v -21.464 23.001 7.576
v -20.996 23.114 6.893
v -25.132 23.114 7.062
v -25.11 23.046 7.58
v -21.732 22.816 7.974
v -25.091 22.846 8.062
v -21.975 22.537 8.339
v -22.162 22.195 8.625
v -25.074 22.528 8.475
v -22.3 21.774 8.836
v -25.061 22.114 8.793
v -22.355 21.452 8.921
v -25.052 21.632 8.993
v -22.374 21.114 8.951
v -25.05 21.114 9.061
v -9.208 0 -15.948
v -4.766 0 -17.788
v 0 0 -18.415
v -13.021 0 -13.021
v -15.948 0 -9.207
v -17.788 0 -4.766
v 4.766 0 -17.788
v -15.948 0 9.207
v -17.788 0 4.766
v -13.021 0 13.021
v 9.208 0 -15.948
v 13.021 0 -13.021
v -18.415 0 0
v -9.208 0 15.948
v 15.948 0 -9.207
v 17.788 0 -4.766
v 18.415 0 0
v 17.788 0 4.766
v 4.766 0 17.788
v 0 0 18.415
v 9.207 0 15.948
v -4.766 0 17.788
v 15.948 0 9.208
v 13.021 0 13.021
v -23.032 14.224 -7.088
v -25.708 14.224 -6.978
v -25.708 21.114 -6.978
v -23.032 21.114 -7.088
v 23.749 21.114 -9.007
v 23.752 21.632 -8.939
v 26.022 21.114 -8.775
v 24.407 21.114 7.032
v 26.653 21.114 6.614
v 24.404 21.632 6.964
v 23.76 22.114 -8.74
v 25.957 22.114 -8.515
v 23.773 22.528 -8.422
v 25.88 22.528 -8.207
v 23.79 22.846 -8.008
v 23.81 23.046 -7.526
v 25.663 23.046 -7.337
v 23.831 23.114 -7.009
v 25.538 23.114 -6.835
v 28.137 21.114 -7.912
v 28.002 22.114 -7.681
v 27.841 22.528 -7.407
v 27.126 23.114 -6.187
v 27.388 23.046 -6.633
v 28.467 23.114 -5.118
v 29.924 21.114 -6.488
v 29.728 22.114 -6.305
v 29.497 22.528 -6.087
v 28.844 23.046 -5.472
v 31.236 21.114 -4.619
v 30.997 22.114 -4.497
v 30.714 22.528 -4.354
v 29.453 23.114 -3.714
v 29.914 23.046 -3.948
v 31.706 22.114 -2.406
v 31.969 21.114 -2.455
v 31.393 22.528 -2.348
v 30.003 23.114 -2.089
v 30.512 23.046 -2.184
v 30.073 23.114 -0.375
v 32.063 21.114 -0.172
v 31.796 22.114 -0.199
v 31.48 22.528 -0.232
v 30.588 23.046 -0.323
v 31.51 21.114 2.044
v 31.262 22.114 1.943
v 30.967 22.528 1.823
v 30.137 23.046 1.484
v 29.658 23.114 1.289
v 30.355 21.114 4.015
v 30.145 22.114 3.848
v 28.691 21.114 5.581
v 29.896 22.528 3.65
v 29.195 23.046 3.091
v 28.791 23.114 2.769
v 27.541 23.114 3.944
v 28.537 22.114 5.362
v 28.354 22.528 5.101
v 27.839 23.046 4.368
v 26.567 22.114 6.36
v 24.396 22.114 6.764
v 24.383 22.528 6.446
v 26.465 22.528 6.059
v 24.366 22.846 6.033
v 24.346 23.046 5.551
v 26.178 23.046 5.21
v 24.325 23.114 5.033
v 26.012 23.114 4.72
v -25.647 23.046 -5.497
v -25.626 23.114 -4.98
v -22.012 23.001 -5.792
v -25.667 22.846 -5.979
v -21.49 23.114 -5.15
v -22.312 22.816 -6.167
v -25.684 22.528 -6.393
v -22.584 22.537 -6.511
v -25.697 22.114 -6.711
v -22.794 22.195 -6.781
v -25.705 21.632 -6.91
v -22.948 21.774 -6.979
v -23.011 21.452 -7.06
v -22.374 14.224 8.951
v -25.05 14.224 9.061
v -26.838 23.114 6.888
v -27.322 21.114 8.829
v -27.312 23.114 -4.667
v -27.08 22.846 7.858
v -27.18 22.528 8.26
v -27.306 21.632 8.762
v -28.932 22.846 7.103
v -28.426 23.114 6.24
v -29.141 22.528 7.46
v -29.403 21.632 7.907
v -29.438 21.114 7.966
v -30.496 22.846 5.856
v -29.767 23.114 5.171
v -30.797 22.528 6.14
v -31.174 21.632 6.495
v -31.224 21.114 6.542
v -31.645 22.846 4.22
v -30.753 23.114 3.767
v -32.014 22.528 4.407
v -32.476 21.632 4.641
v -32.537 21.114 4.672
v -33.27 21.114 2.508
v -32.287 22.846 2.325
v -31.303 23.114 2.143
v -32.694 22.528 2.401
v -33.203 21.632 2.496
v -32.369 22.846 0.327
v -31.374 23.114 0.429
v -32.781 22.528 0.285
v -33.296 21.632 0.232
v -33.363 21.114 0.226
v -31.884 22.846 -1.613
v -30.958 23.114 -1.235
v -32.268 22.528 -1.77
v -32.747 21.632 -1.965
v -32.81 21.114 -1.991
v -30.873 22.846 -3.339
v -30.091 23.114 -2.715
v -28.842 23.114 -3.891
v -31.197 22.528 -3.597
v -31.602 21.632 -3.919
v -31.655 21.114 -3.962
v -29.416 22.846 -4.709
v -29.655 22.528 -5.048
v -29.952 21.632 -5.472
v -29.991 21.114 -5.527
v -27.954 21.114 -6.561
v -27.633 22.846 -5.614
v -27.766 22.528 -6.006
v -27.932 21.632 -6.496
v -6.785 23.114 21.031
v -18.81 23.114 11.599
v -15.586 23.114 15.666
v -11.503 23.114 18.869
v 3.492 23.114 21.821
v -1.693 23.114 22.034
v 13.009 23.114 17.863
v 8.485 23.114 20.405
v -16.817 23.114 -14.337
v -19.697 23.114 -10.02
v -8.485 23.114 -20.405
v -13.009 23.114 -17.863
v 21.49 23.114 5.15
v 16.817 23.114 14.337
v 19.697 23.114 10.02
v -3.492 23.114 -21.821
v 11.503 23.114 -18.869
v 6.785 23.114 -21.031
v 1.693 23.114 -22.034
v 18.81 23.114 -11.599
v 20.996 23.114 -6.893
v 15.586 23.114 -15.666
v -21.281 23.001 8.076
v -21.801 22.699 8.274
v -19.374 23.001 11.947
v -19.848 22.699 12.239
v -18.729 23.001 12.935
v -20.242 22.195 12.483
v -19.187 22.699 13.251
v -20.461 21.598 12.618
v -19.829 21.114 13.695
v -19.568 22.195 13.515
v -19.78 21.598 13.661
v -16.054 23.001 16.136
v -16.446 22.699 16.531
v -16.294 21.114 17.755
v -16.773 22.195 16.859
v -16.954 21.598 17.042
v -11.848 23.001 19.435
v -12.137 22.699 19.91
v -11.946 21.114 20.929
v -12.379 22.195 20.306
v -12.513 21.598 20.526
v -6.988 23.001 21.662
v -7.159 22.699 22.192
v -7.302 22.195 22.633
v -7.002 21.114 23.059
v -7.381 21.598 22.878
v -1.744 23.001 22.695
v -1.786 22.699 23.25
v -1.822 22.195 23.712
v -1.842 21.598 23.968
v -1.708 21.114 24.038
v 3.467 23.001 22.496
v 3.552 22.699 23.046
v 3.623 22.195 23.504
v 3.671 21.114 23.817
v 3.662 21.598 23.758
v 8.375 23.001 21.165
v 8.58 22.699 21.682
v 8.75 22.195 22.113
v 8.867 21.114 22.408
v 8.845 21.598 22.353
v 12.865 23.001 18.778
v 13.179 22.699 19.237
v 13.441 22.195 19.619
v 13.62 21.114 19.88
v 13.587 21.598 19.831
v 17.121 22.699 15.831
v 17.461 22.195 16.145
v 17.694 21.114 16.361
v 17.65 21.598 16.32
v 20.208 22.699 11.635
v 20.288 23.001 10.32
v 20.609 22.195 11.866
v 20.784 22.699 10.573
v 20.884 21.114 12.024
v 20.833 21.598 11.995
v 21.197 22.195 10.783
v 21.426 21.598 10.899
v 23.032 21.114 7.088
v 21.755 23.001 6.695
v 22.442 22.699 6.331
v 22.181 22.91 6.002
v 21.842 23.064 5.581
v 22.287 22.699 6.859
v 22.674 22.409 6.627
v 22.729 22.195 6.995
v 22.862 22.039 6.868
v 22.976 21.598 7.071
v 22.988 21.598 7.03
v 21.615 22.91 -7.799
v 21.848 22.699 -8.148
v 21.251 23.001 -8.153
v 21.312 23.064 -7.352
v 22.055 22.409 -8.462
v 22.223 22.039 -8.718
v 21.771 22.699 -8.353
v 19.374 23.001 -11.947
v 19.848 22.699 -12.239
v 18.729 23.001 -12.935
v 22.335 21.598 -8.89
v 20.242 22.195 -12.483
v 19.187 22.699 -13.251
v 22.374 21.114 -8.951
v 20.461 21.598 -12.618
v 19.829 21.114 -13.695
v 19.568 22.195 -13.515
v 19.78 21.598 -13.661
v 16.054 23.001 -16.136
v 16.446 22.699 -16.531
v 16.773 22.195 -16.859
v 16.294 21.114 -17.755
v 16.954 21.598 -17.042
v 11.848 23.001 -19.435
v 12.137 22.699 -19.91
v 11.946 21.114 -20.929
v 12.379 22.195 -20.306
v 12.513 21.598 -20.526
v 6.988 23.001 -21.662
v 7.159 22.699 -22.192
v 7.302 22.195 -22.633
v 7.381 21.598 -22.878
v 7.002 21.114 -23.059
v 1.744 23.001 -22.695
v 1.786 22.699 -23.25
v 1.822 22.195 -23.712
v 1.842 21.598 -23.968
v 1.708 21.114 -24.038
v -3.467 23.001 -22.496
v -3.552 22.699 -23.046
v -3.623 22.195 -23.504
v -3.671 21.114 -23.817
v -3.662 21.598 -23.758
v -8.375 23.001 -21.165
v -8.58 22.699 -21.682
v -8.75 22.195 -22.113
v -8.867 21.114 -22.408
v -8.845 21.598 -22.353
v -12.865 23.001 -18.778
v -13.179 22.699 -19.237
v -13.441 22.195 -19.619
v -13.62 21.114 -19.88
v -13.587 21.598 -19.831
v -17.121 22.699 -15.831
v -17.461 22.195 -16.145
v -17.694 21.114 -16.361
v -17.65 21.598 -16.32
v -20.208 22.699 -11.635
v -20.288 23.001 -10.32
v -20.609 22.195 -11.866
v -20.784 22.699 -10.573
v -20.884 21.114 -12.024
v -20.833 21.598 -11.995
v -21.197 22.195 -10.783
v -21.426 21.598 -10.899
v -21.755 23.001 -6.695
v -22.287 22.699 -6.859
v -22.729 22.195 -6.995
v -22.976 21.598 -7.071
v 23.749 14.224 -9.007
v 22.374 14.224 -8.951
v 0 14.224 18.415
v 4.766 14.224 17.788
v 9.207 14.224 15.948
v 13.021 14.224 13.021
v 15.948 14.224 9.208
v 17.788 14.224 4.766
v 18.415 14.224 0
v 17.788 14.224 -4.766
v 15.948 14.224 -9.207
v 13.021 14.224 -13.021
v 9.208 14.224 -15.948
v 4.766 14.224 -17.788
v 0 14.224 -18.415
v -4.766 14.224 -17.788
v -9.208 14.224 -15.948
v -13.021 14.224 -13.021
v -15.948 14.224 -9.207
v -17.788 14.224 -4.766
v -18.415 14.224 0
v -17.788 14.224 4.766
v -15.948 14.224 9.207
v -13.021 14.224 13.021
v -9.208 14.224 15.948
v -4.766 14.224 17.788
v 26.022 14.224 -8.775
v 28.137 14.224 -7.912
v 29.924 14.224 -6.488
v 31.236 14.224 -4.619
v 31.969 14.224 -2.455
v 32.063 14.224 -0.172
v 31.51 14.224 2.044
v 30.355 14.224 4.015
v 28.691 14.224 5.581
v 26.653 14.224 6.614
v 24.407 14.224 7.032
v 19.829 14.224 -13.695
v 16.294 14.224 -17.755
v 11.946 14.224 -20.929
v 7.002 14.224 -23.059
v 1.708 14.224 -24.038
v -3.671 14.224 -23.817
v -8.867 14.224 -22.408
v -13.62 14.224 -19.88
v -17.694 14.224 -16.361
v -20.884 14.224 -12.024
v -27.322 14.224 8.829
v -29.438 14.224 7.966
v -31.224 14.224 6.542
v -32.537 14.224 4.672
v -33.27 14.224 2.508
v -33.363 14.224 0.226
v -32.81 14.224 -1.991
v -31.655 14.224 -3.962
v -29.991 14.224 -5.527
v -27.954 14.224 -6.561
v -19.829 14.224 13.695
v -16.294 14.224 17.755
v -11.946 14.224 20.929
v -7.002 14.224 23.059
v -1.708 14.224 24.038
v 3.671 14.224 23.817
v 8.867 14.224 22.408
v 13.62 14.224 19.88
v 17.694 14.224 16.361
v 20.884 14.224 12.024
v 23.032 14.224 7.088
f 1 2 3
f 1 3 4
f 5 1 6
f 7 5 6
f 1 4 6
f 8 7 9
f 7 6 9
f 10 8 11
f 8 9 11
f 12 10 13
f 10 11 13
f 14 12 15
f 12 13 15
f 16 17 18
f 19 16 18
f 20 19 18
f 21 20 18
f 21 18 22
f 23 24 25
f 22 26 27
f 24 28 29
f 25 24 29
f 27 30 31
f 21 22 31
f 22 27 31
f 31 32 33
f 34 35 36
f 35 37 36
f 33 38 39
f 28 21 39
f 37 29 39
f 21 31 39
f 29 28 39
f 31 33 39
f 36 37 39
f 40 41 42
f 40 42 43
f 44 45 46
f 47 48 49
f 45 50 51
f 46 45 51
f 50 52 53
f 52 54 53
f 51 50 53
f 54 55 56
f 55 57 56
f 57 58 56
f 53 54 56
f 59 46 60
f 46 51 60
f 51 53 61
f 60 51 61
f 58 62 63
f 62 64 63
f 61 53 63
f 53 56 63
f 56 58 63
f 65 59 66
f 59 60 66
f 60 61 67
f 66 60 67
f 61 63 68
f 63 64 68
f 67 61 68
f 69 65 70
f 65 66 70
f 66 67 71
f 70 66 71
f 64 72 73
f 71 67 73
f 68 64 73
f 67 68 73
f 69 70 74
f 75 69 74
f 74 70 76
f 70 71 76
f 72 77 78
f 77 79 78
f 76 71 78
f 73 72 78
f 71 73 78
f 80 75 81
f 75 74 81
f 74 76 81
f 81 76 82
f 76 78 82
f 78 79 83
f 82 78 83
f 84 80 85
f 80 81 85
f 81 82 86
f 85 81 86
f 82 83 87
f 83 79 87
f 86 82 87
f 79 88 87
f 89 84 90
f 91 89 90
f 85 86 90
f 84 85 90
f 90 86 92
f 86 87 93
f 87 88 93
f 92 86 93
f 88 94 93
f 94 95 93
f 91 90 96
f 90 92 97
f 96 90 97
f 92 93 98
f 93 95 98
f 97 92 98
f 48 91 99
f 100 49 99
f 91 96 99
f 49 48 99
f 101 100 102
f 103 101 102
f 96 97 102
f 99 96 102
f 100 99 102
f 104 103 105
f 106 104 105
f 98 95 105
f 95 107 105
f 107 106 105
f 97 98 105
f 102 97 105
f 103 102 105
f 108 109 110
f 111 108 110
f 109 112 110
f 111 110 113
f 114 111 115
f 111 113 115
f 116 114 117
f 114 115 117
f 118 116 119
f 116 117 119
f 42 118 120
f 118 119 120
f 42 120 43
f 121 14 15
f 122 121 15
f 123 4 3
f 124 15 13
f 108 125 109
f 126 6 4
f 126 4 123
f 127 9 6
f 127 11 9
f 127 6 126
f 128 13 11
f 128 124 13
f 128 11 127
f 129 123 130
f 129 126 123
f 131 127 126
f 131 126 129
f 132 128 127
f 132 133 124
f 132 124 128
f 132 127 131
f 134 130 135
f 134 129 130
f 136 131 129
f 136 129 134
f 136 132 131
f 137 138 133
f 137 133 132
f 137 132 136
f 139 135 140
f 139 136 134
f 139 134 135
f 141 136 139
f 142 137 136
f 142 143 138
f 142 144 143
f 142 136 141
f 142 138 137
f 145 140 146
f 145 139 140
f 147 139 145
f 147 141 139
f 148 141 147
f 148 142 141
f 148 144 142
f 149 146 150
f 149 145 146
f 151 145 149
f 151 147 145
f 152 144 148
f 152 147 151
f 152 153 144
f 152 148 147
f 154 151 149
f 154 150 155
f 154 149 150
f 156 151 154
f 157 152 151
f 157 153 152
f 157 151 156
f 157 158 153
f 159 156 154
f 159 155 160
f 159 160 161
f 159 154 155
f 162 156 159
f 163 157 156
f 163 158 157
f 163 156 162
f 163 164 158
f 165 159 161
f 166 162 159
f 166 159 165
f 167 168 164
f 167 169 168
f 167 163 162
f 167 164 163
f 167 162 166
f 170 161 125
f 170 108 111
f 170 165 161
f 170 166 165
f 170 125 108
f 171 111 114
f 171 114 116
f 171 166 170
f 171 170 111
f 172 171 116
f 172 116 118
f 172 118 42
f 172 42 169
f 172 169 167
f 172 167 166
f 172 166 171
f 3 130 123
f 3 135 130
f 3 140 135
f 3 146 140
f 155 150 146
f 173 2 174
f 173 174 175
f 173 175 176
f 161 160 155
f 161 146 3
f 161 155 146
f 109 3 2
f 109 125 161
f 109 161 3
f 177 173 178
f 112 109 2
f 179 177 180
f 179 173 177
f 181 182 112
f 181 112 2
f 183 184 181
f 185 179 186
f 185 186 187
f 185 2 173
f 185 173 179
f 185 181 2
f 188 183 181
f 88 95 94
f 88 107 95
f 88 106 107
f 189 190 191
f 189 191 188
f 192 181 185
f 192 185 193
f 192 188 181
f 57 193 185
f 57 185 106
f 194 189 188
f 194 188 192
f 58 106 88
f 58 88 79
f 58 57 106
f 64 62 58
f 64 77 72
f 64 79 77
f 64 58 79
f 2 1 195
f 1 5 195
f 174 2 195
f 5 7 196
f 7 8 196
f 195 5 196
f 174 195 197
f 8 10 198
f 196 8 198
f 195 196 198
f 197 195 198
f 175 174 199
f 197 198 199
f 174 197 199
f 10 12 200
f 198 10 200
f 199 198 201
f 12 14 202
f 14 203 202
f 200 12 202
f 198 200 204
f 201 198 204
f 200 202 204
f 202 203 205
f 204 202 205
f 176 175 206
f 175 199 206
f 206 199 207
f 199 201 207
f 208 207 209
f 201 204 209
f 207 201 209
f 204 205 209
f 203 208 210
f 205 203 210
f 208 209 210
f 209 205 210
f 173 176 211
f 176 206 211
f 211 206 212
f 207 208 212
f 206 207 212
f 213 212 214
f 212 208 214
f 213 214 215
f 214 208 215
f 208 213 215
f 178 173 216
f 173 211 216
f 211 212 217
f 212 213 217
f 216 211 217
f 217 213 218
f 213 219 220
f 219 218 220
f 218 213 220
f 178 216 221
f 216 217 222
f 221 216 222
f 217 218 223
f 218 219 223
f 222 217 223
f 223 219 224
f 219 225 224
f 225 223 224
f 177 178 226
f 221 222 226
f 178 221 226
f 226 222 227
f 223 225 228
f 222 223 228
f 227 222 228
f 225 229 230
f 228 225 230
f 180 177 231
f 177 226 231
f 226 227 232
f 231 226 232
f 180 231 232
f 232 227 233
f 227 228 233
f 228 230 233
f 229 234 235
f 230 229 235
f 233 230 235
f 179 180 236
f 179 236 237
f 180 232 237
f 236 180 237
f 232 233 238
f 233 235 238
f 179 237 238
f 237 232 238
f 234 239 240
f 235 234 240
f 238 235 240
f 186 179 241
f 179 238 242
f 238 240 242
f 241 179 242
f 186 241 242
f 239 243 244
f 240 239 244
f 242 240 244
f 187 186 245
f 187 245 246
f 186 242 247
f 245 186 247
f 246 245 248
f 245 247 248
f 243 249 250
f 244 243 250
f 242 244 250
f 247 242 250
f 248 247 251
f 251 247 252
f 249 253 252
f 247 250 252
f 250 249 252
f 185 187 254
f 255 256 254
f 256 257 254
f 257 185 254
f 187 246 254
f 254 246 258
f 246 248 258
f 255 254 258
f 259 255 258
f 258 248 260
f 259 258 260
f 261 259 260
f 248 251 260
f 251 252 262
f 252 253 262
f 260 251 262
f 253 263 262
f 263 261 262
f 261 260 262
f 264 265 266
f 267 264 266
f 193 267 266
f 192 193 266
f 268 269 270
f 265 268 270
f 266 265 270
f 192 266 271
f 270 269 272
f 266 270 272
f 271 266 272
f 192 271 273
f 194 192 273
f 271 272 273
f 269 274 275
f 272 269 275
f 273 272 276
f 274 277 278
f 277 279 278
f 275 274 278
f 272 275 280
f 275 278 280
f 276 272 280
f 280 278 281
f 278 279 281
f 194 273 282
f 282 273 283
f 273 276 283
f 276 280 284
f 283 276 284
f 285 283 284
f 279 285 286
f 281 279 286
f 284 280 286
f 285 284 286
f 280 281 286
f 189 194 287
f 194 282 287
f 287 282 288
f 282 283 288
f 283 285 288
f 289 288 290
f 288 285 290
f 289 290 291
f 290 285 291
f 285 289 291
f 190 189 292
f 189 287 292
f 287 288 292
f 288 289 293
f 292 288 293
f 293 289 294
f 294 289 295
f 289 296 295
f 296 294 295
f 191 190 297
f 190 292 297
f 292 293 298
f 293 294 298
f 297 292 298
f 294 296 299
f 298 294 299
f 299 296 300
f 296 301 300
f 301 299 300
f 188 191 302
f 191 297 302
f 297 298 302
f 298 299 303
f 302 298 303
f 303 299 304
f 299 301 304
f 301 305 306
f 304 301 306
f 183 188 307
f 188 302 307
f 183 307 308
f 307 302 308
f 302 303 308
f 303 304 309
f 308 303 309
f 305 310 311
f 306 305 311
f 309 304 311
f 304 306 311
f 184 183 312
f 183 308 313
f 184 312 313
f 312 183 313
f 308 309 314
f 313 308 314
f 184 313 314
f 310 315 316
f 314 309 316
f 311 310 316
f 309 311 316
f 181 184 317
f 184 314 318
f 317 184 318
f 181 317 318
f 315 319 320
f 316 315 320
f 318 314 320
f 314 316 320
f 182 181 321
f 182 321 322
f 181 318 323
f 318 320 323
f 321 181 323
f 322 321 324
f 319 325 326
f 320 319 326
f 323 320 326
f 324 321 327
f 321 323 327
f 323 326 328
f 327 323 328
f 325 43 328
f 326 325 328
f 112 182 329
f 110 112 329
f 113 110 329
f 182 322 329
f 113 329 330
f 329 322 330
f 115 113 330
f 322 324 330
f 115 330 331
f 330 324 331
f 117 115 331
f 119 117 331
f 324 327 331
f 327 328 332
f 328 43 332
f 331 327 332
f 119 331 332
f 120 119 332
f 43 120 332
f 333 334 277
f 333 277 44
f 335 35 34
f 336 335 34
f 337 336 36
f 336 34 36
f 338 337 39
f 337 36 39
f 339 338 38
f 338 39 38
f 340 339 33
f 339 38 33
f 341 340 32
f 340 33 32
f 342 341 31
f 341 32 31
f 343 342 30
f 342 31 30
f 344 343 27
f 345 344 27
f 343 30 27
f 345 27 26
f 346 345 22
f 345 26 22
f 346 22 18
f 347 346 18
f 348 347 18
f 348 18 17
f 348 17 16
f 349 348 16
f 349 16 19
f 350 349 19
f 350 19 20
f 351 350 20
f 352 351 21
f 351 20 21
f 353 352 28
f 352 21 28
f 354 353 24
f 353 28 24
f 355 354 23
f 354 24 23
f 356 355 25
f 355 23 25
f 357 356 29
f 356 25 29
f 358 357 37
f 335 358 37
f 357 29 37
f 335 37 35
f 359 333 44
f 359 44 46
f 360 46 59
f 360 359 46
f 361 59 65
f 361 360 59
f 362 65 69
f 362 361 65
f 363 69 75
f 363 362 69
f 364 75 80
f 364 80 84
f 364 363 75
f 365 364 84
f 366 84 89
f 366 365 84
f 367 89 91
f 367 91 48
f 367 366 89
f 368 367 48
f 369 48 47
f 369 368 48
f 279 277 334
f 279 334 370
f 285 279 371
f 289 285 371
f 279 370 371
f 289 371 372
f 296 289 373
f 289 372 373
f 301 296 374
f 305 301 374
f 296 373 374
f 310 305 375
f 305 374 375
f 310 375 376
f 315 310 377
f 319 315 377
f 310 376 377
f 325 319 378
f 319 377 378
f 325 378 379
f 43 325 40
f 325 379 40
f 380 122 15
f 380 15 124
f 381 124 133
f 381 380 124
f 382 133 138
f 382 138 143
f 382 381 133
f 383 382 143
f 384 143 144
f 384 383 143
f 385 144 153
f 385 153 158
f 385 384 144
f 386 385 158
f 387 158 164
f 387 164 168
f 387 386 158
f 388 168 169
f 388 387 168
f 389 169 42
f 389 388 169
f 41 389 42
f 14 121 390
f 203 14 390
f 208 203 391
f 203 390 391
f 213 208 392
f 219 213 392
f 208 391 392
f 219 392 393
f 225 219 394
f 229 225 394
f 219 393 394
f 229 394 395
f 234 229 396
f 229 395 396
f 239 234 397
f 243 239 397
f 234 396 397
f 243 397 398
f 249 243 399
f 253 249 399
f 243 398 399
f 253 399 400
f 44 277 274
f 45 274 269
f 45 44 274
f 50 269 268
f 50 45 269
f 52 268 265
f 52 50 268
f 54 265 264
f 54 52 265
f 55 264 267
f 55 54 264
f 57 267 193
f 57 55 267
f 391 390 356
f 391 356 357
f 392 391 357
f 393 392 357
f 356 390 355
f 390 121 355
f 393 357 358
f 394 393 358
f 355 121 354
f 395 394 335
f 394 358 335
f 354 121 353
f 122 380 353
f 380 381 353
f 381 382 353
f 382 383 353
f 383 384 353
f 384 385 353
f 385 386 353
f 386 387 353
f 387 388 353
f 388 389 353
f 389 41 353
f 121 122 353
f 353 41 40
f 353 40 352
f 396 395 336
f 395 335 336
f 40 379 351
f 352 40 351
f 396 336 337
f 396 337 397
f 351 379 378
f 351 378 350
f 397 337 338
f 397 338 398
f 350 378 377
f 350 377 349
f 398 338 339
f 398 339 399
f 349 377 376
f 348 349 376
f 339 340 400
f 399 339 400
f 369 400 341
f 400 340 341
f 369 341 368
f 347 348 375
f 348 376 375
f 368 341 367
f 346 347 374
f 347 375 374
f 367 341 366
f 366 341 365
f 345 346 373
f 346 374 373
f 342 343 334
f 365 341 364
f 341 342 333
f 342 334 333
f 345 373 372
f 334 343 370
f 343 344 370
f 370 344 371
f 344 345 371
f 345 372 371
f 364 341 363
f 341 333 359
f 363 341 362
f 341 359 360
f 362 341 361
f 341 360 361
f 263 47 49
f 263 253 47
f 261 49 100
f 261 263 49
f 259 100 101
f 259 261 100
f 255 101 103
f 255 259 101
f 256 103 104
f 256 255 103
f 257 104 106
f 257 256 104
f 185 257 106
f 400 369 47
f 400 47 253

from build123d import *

# Parameters (mm, degrees)
SKETCH11_R = 18.415
NECK_DEPTH = 14.224
SKETCH12_R = 24.098503073
LID_DEPTH  = 8.89
FILLET3_R  = 2


with BuildPart() as part:
    # Sketch11 → neck (new body)
    with BuildSketch(Plane(origin=(0, 0, 0), x_dir=(1, 0, 0), z_dir=(0, 1, 0))):
        with Locations(Location((0, 0, 0), (0, 0, 270))):
            Circle(SKETCH11_R)
    extrude(amount=NECK_DEPTH)

    # Sketch12 → lid (add)
    with BuildSketch(Plane(origin=(0, 14.224, 0), x_dir=(1, 0, 0), z_dir=(0, 1, 0))):
        Circle(SKETCH12_R)
        with BuildLine():
            Line((-25.707660556, 6.978419473), (23.749239481, 9.0074205))
            ThreePointArc((23.749239481, 9.0074205), (32.097843424, 1.316834602), (24.407257526, -7.031769341))
            Line((24.407257526, -7.031769341), (-25.049642512, -9.060770368))
            ThreePointArc((-25.049642512, -9.060770368), (-33.398246454, -1.37018447), (-25.707660556, 6.978419473))
        make_face()
    extrude(amount=LID_DEPTH)

    # Fillet3
    fillet3_edges = [part.edges().sort_by_distance(p)[0] for p in [
        (-24.370076377, 23.114, -7.033294721),
        (23.061856817, 23.114, -8.979220186),
        (-0.98782558, 23.114, -24.078248504),
        (-33.398246454, 23.114, 1.37018447),
        (-23.712058333, 23.114, 9.00589512),
        (0.98782558, 23.114, 24.078248504),
        (23.719874862, 23.114, 7.059969655),
        (32.097843424, 23.114, -1.316834602),
    ]]
    fillet(fillet3_edges, radius=FILLET3_R)


solid = part.part
